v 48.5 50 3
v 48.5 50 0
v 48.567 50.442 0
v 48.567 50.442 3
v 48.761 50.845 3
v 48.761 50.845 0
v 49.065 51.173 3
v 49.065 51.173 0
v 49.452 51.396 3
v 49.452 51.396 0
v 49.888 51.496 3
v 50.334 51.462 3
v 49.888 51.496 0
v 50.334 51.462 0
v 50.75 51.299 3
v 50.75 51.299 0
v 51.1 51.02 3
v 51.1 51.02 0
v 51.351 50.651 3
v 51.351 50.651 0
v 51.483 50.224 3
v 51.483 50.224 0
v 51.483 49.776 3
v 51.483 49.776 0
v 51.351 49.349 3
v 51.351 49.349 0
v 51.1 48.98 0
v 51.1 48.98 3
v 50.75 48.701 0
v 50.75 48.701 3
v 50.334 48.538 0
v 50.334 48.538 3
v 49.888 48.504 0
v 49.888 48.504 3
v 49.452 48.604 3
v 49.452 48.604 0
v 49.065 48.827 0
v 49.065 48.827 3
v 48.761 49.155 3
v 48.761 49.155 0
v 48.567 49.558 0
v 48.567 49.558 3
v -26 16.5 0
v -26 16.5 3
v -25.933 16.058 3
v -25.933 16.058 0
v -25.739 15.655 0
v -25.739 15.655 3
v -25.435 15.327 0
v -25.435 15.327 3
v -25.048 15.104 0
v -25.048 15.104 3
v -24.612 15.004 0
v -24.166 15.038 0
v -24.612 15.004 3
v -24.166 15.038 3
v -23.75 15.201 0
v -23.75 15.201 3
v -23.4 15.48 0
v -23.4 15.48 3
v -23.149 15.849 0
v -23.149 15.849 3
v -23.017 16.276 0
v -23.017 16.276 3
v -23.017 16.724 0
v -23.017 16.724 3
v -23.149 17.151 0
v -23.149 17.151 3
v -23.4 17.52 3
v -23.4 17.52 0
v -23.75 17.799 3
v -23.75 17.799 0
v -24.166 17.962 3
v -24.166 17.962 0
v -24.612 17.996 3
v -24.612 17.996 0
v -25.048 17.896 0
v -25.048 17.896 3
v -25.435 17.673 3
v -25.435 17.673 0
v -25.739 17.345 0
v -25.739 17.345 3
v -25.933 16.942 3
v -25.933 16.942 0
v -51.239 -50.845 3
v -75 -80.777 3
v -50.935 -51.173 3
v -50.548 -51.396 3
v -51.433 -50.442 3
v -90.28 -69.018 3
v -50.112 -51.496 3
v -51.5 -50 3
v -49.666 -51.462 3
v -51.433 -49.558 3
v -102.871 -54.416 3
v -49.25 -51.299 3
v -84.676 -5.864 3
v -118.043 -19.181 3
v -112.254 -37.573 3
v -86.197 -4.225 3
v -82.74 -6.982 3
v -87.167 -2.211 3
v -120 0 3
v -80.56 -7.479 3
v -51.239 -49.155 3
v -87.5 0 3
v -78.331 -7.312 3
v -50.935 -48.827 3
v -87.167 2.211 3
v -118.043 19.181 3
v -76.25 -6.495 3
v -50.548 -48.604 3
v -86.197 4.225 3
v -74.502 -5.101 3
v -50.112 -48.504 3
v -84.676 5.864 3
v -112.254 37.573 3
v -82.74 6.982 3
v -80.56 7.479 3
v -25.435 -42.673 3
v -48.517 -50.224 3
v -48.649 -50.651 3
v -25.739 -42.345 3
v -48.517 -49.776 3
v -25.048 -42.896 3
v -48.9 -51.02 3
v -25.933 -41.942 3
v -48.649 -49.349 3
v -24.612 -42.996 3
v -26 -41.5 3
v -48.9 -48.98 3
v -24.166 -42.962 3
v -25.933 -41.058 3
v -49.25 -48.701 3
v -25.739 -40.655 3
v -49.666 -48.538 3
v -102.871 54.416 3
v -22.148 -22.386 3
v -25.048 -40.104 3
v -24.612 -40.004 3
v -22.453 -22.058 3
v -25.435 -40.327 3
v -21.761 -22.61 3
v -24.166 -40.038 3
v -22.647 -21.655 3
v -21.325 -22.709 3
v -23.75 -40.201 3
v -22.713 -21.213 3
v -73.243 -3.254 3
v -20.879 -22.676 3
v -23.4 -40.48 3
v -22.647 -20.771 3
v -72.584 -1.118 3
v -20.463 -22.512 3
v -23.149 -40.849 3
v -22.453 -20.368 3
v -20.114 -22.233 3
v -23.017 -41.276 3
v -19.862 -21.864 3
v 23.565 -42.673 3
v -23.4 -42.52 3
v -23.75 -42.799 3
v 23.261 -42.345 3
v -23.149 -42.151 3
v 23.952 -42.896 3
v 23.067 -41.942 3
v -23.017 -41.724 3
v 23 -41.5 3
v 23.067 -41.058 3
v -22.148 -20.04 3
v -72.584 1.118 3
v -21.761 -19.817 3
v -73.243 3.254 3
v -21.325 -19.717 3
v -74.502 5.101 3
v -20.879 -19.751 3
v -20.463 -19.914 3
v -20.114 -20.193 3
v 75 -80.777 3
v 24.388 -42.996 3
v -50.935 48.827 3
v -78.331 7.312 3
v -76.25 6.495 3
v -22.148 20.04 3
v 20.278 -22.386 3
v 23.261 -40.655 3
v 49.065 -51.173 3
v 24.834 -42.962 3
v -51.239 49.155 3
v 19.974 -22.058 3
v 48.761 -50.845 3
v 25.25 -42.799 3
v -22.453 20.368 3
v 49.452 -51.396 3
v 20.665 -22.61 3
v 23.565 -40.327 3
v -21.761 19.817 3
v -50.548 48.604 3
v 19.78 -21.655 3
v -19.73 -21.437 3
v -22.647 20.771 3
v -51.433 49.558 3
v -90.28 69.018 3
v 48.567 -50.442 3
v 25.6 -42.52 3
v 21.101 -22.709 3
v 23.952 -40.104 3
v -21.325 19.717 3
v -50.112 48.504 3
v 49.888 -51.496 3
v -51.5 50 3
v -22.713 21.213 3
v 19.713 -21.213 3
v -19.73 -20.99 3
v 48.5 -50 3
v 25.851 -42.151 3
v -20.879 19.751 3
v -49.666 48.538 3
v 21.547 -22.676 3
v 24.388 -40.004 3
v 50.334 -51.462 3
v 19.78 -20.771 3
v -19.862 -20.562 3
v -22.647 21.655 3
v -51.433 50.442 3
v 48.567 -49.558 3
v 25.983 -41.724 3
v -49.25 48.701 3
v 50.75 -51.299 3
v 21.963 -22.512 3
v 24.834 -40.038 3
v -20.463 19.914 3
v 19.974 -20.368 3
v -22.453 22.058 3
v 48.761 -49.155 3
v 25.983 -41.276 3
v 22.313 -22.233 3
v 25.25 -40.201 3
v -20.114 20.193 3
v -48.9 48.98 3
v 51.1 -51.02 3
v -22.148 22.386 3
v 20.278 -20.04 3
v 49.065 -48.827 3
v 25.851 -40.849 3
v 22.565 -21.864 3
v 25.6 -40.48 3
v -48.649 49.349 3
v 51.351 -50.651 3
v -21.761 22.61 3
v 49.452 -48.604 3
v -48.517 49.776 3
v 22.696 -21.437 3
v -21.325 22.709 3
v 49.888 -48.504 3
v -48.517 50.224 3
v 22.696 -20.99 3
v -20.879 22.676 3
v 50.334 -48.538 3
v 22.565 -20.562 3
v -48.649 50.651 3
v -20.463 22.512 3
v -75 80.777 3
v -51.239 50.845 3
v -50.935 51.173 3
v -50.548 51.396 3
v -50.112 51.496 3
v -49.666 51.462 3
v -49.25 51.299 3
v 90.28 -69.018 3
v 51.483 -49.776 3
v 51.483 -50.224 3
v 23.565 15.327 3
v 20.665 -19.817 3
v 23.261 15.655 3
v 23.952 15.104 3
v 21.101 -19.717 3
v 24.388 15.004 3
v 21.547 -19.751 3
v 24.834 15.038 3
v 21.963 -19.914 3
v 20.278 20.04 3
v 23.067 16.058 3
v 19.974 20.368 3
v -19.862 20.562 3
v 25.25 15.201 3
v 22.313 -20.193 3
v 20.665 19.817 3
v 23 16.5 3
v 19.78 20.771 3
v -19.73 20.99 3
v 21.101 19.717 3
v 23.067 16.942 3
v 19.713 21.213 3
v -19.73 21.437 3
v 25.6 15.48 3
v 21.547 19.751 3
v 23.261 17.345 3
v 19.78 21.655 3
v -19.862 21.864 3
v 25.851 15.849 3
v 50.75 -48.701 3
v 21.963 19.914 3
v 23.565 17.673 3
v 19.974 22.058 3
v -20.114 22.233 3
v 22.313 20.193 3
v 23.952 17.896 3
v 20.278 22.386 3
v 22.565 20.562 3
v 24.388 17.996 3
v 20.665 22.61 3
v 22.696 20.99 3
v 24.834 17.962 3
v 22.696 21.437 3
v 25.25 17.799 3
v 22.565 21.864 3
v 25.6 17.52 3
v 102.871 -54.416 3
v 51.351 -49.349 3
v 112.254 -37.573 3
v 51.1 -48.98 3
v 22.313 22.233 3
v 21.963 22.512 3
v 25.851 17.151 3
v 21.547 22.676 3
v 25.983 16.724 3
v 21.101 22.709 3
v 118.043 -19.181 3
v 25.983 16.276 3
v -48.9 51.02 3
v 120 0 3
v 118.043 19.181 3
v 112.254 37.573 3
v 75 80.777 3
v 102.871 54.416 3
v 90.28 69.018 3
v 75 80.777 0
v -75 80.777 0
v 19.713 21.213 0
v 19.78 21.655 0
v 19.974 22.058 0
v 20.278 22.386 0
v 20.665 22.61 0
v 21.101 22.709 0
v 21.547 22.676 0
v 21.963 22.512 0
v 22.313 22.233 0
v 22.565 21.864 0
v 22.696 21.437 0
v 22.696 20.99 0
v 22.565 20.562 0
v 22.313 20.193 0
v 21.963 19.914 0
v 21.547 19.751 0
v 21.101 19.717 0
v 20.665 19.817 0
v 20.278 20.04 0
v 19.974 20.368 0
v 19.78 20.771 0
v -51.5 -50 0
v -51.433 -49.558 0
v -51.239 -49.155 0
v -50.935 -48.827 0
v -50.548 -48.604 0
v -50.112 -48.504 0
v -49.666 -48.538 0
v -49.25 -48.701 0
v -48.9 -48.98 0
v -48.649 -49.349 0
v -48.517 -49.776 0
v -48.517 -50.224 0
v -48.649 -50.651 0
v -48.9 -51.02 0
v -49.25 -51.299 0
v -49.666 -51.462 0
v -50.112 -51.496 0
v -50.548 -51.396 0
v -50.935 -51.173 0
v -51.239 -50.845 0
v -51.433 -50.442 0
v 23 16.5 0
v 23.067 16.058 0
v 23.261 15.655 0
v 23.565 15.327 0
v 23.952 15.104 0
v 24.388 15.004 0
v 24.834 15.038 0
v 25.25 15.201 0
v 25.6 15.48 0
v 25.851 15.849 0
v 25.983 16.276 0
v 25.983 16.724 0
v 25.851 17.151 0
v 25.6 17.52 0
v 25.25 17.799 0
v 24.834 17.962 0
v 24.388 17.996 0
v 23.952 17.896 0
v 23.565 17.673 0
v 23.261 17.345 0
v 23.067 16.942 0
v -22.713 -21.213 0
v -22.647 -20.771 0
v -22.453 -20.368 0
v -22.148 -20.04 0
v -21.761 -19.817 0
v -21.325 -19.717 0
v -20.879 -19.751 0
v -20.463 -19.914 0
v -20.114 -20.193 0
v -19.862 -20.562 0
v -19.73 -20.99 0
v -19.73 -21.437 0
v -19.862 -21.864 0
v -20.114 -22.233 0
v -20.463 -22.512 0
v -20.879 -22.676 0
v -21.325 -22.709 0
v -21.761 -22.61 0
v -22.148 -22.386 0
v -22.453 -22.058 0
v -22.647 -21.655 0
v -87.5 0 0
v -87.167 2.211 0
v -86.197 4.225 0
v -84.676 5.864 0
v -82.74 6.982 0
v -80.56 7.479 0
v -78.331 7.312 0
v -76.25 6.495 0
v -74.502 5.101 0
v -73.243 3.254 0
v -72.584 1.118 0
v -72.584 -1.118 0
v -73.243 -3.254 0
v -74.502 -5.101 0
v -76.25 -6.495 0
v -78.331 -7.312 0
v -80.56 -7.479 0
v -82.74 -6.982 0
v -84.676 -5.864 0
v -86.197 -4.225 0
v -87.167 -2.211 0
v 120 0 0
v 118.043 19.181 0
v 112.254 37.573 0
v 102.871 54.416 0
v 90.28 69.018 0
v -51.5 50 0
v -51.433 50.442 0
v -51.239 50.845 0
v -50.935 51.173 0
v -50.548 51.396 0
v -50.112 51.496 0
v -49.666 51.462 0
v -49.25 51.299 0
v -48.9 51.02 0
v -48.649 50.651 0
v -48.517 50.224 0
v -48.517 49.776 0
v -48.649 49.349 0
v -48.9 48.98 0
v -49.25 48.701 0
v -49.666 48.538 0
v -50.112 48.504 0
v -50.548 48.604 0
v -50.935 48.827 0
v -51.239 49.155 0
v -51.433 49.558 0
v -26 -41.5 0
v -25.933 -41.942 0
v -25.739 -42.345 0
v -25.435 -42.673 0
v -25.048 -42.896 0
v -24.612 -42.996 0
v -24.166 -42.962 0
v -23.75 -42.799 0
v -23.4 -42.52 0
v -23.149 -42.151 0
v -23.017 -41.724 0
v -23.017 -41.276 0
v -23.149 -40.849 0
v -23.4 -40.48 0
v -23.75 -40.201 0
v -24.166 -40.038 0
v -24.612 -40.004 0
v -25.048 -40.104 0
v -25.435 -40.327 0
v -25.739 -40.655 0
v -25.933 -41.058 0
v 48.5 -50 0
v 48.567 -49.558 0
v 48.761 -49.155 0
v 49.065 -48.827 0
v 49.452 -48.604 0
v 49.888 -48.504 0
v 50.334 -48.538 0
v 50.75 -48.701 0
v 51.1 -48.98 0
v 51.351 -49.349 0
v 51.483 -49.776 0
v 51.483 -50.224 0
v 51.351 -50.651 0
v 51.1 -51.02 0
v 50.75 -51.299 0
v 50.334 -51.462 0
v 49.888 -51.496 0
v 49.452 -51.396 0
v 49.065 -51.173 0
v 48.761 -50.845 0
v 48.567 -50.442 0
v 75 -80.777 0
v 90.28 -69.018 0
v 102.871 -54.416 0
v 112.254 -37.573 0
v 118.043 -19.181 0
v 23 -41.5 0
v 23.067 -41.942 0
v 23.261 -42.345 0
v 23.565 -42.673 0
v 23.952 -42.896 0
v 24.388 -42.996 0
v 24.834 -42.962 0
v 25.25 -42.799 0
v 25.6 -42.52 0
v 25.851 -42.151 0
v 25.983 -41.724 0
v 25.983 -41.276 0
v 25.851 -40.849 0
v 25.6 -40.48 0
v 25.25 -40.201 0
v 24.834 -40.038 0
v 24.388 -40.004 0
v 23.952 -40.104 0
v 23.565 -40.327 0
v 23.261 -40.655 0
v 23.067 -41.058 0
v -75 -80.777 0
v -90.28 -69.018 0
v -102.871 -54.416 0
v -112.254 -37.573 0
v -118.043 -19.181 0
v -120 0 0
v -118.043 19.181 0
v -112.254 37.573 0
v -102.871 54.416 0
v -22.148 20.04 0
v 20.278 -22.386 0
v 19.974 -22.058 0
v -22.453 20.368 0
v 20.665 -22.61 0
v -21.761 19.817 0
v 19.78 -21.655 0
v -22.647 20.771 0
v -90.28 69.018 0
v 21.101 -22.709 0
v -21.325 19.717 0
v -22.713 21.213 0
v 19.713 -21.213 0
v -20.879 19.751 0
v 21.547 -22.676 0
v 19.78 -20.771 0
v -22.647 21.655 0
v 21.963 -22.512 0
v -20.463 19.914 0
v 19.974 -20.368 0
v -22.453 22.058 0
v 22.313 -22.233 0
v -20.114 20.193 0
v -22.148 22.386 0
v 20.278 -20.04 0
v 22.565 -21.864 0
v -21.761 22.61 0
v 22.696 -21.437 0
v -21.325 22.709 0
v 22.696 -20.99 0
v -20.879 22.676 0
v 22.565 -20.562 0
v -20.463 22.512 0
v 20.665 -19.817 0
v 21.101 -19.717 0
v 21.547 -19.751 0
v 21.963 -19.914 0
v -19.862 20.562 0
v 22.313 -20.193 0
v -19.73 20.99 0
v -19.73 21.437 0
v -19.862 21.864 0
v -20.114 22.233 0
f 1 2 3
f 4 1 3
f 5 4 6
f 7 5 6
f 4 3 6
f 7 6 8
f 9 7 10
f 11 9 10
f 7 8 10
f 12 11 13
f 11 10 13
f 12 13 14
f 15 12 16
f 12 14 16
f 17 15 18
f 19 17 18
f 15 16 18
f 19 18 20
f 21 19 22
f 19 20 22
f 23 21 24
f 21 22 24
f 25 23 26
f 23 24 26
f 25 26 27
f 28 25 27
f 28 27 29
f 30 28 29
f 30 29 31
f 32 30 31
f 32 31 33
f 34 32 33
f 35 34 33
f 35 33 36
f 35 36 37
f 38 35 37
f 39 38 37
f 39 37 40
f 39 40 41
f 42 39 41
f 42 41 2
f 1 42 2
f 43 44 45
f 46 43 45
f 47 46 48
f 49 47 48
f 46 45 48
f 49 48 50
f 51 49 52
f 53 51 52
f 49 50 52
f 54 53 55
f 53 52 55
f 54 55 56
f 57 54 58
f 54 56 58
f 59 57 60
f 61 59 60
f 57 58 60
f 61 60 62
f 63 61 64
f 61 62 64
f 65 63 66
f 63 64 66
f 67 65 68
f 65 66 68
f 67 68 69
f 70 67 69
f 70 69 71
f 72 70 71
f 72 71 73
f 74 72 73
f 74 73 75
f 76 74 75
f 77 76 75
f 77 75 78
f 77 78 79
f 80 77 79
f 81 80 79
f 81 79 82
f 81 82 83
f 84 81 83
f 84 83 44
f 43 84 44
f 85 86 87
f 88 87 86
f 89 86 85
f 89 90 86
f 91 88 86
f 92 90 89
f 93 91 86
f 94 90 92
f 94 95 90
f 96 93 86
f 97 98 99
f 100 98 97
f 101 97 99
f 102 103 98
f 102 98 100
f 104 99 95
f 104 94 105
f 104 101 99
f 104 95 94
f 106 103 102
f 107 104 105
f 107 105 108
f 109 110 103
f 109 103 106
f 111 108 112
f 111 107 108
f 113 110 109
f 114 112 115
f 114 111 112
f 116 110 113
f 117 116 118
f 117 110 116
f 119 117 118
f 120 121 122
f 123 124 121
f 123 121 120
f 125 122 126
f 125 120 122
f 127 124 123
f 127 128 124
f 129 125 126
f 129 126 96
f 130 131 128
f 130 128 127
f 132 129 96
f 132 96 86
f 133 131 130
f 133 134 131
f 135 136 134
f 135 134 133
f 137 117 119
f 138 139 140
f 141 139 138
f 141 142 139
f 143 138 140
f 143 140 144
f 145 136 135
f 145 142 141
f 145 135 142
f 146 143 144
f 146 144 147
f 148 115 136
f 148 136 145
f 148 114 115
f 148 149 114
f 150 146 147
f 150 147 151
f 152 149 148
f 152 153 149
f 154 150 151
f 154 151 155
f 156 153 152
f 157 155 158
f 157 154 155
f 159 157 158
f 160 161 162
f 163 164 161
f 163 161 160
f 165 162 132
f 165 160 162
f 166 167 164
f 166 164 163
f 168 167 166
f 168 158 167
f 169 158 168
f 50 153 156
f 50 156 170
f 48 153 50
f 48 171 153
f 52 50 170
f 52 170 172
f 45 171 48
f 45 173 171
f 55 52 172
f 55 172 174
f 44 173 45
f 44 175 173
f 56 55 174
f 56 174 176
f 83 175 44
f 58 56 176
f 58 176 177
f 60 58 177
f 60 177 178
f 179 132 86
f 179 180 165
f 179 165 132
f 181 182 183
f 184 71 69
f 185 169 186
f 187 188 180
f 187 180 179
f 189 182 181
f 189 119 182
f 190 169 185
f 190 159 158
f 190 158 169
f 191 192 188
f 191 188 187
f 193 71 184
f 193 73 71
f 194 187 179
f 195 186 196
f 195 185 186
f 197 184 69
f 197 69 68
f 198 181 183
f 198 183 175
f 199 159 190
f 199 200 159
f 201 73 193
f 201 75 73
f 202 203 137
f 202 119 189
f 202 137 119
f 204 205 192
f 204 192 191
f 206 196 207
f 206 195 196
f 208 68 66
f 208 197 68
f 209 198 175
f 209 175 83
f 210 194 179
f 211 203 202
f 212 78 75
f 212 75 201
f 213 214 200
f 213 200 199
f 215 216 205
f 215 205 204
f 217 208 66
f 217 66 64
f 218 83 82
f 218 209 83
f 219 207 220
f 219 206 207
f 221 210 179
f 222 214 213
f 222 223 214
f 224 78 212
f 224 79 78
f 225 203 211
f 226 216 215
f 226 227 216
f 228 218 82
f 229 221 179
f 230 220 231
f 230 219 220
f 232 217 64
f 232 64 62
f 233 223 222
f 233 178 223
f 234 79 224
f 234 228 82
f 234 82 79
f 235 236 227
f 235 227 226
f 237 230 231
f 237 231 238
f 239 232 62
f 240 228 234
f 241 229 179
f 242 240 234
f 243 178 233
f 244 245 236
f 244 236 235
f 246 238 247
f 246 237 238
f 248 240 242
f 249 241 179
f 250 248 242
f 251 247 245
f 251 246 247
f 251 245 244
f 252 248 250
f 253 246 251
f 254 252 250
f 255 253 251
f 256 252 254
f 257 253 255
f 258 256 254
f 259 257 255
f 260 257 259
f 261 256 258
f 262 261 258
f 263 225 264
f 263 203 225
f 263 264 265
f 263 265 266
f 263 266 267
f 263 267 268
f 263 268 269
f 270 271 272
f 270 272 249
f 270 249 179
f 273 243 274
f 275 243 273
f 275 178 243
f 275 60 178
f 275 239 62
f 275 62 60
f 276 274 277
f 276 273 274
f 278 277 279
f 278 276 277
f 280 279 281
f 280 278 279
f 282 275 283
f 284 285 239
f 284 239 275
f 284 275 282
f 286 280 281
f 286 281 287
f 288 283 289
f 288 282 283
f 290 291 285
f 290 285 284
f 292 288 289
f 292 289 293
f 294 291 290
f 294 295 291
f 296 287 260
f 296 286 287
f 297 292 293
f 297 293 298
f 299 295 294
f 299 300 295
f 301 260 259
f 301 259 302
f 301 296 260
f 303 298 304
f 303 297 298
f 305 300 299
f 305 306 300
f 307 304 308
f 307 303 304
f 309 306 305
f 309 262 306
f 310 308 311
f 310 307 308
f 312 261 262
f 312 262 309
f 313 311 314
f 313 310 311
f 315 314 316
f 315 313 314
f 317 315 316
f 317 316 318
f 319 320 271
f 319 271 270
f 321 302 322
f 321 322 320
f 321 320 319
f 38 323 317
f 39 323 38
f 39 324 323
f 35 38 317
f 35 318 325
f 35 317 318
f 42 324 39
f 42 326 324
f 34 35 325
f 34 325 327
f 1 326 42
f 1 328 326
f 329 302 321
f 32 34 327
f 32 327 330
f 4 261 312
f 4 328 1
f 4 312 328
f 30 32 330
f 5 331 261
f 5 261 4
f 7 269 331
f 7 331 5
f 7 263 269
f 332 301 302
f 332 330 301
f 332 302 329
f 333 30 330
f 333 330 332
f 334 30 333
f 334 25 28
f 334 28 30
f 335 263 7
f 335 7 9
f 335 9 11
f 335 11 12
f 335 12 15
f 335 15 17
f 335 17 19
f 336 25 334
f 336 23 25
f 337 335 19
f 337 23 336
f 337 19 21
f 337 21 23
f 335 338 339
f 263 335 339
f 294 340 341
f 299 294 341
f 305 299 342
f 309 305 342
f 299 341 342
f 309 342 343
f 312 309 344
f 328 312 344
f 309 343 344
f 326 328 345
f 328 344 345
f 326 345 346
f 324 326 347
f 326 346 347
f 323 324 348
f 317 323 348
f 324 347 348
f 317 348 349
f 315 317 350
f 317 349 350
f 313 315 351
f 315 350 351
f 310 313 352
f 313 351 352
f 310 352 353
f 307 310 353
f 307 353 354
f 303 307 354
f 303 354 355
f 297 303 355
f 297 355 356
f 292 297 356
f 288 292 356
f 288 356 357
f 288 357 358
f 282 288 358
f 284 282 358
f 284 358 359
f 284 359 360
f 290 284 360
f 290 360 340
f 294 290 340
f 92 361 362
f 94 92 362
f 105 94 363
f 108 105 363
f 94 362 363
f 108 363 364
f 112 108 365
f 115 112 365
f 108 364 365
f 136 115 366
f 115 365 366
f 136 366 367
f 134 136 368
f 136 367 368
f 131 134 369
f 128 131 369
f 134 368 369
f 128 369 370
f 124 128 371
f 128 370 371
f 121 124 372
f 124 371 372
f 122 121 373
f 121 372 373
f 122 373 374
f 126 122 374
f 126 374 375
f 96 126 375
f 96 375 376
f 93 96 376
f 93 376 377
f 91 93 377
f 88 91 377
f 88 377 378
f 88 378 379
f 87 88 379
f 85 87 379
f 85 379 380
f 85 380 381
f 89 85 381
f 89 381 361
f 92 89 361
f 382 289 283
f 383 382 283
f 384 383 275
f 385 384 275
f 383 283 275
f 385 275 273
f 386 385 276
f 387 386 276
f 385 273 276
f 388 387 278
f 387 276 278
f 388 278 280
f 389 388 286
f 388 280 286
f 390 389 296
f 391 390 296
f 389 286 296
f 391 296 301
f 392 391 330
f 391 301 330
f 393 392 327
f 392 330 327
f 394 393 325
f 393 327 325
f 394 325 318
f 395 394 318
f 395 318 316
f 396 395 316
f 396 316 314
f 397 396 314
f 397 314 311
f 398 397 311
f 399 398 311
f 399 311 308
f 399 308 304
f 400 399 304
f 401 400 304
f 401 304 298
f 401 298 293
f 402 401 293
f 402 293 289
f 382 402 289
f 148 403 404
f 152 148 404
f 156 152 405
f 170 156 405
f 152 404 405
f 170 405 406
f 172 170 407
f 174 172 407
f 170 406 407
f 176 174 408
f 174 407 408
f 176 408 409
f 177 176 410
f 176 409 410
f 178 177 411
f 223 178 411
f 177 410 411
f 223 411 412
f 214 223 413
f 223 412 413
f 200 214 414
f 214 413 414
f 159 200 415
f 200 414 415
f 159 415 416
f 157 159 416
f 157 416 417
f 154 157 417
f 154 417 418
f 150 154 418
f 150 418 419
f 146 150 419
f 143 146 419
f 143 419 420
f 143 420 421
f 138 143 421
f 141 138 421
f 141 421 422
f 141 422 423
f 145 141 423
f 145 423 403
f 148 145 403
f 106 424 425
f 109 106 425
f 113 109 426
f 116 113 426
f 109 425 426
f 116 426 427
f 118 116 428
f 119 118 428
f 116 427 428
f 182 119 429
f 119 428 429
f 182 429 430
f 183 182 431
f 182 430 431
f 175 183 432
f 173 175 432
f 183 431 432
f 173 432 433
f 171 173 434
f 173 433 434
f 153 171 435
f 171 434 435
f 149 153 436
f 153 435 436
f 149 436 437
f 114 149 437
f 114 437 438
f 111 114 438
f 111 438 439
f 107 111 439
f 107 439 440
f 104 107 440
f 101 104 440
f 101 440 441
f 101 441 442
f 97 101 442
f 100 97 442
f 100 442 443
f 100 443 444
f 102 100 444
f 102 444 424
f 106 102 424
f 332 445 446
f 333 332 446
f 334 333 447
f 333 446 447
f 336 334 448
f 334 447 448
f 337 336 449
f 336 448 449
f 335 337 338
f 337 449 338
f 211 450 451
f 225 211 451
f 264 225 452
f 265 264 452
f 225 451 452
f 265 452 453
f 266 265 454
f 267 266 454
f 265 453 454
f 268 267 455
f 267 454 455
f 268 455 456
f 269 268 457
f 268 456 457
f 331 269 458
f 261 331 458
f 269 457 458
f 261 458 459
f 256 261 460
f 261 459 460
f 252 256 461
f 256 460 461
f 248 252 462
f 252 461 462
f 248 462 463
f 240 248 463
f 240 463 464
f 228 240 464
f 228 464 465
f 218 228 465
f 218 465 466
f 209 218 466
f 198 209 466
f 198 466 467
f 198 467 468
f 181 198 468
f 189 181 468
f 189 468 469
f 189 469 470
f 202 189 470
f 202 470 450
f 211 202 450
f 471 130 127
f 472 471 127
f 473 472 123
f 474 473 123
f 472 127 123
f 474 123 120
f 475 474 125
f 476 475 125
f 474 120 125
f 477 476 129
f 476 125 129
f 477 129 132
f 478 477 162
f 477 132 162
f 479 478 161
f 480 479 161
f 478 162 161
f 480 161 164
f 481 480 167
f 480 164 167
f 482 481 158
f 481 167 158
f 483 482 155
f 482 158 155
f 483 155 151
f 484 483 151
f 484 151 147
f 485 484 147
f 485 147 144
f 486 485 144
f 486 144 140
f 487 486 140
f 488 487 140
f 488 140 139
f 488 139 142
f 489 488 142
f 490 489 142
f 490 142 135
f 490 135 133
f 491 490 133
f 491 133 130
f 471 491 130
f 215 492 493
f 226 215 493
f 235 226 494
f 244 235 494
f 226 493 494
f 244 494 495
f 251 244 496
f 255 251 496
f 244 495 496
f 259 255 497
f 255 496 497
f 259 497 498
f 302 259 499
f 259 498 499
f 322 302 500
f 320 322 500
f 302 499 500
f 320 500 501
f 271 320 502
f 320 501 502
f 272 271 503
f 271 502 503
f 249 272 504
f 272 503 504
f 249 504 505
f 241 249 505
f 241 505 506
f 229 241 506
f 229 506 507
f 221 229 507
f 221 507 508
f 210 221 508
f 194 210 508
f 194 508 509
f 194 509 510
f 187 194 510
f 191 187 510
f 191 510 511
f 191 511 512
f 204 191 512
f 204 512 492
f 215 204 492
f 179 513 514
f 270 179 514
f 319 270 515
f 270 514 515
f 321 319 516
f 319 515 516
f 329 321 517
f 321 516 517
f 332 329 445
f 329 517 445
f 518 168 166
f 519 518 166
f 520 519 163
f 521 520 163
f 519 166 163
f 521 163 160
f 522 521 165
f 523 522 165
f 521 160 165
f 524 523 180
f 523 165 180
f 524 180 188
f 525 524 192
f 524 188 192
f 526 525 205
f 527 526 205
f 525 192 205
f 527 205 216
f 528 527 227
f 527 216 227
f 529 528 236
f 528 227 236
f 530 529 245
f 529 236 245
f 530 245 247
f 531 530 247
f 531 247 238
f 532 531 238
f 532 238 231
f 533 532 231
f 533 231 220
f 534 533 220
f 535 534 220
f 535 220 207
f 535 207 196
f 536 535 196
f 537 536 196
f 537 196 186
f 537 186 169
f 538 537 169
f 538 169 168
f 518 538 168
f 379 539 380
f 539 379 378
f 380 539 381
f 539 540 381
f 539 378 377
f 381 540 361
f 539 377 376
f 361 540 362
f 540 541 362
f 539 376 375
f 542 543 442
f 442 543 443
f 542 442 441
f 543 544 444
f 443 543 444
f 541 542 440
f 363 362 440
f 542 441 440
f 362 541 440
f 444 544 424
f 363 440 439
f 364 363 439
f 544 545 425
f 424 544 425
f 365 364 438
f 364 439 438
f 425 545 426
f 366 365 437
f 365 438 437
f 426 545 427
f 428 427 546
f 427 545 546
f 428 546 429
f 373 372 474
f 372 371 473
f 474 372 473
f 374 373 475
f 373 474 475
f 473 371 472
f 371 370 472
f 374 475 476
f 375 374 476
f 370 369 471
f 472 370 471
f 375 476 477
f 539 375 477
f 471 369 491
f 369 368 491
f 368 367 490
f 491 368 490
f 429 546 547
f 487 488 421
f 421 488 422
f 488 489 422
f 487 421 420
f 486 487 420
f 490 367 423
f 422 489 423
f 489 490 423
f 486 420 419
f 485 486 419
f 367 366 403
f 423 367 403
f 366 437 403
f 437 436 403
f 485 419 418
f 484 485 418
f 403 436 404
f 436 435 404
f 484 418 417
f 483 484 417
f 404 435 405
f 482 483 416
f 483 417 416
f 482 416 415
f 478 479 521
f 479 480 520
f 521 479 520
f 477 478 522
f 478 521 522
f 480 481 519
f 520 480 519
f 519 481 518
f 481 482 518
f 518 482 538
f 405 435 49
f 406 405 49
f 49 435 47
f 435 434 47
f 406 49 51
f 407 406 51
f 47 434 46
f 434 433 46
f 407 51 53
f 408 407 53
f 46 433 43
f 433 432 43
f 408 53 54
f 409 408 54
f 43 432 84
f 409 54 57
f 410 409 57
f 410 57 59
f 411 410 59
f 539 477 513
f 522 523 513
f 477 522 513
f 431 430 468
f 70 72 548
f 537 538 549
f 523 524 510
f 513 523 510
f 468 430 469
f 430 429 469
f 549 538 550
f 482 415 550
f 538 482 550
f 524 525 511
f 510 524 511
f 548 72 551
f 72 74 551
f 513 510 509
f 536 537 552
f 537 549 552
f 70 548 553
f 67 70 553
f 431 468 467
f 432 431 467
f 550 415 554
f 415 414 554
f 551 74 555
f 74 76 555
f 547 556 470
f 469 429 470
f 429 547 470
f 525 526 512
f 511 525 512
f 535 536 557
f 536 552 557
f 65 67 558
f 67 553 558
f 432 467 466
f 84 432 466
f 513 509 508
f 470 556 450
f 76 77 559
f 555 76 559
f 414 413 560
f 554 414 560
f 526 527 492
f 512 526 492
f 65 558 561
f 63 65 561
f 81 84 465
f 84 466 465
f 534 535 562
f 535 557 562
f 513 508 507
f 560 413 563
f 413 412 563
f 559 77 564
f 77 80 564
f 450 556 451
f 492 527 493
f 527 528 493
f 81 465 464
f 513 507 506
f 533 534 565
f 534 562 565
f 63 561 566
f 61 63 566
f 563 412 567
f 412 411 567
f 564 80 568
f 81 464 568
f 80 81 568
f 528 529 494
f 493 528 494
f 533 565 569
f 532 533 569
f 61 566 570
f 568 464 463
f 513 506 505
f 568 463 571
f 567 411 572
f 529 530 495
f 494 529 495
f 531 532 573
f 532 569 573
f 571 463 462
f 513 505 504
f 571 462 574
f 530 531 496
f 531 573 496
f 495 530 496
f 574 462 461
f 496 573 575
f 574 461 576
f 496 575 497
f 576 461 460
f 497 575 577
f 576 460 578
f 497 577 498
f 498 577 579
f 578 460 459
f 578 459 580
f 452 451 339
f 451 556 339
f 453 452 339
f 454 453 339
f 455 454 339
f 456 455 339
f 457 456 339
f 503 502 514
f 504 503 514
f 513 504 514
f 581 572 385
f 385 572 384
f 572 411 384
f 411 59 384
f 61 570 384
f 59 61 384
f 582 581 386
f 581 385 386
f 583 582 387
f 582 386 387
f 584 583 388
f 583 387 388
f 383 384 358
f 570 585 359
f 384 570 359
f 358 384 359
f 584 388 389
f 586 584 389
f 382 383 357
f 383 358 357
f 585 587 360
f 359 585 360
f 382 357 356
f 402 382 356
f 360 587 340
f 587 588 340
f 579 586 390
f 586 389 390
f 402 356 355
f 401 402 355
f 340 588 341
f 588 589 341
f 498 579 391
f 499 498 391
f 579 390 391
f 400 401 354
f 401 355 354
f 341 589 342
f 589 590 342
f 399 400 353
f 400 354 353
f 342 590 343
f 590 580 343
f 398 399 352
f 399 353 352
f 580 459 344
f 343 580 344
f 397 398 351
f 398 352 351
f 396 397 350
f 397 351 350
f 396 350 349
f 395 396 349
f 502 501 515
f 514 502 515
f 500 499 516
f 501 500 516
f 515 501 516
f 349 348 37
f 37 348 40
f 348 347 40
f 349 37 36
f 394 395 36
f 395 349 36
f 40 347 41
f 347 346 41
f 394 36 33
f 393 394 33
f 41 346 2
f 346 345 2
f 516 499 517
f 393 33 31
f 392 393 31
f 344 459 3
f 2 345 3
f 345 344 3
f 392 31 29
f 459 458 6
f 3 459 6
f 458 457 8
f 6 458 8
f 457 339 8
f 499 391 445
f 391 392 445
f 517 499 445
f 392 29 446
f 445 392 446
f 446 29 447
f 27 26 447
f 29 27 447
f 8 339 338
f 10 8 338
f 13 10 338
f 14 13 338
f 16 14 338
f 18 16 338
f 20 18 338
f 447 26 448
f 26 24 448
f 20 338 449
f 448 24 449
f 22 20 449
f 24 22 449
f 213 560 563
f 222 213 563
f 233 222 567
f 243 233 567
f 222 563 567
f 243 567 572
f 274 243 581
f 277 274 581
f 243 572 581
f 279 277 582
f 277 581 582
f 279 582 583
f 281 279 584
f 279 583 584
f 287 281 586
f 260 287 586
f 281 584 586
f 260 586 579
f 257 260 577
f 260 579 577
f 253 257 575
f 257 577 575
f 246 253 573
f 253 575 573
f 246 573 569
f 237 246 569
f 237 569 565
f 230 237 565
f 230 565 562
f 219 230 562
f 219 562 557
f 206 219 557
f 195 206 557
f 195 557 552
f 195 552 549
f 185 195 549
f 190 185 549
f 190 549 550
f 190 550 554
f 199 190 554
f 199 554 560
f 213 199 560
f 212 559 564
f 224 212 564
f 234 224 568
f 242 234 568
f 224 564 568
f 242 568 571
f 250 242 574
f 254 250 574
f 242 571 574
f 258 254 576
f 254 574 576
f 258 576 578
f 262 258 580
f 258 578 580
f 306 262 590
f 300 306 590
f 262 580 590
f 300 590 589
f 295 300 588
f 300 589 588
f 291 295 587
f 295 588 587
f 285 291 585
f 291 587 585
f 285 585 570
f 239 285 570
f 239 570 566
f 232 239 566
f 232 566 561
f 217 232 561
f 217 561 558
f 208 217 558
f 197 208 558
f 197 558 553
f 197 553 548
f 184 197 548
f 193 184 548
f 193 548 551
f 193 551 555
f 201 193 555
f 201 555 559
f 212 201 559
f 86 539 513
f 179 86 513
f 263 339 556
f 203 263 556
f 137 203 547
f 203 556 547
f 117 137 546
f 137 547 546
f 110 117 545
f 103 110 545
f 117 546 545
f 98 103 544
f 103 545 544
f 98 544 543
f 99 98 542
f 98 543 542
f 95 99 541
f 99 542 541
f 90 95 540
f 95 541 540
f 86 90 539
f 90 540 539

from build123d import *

# Parameters (mm, degrees)
F1_DEPTH = 3
F3_D     = 3
F5_D     = 3
F7_D     = 3
F9_D     = 15


with BuildPart() as f1:
    # F0 (on Top) → F1 (new body)
    with BuildSketch(Plane.XY):
        with BuildLine():
            Line((-25, 80.777472107), (-75, 80.777472107))
            ThreePointArc((-75, 80.777472107), (-120, 0), (-75, -80.777472107))
            Line((-75, -80.777472107), (-25, -80.777472107))
            ThreePointArc((-25, -80.777472107), (-70, 0), (-25, 80.777472107))
        make_face()
        with BuildLine():
            Line((25, 80.777472107), (-25, 80.777472107))
            ThreePointArc((-25, 80.777472107), (-70, 0), (-25, -80.777472107))
            Line((-25, -80.777472107), (25, -80.777472107))
            ThreePointArc((25, -80.777472107), (57.9909633635, -46.2331050223), (70, 0))
            ThreePointArc((70, 0), (57.9909633635, 46.2331050223), (25, 80.777472107))
        make_face()
        with BuildLine():
            Line((75, 80.777472107), (25, 80.777472107))
            ThreePointArc((25, 80.777472107), (57.9909633635, 46.2331050223), (70, 0))
            ThreePointArc((70, 0), (57.9909633635, -46.2331050223), (25, -80.777472107))
            Line((25, -80.777472107), (75, -80.777472107))
            ThreePointArc((75, -80.777472107), (107.9909633635, -46.2331050223), (120, 0))
            ThreePointArc((120, 0), (107.9909633635, 46.2331050223), (75, 80.777472107))
        make_face()
    extrude(amount=F1_DEPTH)

    # F3 (through all)
    with Locations(Plane.XY.offset(3)):
        with Locations((-50, 50), (50, 50), (50, -50), (-50, -50)):
            Hole(F3_D / 2)

    # F5 (through all)
    with Locations(Plane.XY.offset(3)):
        with Locations((-21.2132034356, 21.2132034356), (21.2132034356, 21.2132034356), (21.2132034356, -21.2132034356), (-21.2132034356, -21.2132034356)):
            Hole(F5_D / 2)

    # F7 (through all)
    with Locations(Plane(origin=(0, 0, 0), x_dir=(1, 0, 0), z_dir=(0, 0, -1))):
        with Locations((-24.5, 41.5), (24.5, 41.5), (24.5, -16.5), (-24.5, -16.5)):
            Hole(F7_D / 2)

    # F9 (through all)
    with Locations(Plane.XY.offset(3)):
        with Locations((-80, 0)):
            Hole(F9_D / 2)


solid = f1.part
